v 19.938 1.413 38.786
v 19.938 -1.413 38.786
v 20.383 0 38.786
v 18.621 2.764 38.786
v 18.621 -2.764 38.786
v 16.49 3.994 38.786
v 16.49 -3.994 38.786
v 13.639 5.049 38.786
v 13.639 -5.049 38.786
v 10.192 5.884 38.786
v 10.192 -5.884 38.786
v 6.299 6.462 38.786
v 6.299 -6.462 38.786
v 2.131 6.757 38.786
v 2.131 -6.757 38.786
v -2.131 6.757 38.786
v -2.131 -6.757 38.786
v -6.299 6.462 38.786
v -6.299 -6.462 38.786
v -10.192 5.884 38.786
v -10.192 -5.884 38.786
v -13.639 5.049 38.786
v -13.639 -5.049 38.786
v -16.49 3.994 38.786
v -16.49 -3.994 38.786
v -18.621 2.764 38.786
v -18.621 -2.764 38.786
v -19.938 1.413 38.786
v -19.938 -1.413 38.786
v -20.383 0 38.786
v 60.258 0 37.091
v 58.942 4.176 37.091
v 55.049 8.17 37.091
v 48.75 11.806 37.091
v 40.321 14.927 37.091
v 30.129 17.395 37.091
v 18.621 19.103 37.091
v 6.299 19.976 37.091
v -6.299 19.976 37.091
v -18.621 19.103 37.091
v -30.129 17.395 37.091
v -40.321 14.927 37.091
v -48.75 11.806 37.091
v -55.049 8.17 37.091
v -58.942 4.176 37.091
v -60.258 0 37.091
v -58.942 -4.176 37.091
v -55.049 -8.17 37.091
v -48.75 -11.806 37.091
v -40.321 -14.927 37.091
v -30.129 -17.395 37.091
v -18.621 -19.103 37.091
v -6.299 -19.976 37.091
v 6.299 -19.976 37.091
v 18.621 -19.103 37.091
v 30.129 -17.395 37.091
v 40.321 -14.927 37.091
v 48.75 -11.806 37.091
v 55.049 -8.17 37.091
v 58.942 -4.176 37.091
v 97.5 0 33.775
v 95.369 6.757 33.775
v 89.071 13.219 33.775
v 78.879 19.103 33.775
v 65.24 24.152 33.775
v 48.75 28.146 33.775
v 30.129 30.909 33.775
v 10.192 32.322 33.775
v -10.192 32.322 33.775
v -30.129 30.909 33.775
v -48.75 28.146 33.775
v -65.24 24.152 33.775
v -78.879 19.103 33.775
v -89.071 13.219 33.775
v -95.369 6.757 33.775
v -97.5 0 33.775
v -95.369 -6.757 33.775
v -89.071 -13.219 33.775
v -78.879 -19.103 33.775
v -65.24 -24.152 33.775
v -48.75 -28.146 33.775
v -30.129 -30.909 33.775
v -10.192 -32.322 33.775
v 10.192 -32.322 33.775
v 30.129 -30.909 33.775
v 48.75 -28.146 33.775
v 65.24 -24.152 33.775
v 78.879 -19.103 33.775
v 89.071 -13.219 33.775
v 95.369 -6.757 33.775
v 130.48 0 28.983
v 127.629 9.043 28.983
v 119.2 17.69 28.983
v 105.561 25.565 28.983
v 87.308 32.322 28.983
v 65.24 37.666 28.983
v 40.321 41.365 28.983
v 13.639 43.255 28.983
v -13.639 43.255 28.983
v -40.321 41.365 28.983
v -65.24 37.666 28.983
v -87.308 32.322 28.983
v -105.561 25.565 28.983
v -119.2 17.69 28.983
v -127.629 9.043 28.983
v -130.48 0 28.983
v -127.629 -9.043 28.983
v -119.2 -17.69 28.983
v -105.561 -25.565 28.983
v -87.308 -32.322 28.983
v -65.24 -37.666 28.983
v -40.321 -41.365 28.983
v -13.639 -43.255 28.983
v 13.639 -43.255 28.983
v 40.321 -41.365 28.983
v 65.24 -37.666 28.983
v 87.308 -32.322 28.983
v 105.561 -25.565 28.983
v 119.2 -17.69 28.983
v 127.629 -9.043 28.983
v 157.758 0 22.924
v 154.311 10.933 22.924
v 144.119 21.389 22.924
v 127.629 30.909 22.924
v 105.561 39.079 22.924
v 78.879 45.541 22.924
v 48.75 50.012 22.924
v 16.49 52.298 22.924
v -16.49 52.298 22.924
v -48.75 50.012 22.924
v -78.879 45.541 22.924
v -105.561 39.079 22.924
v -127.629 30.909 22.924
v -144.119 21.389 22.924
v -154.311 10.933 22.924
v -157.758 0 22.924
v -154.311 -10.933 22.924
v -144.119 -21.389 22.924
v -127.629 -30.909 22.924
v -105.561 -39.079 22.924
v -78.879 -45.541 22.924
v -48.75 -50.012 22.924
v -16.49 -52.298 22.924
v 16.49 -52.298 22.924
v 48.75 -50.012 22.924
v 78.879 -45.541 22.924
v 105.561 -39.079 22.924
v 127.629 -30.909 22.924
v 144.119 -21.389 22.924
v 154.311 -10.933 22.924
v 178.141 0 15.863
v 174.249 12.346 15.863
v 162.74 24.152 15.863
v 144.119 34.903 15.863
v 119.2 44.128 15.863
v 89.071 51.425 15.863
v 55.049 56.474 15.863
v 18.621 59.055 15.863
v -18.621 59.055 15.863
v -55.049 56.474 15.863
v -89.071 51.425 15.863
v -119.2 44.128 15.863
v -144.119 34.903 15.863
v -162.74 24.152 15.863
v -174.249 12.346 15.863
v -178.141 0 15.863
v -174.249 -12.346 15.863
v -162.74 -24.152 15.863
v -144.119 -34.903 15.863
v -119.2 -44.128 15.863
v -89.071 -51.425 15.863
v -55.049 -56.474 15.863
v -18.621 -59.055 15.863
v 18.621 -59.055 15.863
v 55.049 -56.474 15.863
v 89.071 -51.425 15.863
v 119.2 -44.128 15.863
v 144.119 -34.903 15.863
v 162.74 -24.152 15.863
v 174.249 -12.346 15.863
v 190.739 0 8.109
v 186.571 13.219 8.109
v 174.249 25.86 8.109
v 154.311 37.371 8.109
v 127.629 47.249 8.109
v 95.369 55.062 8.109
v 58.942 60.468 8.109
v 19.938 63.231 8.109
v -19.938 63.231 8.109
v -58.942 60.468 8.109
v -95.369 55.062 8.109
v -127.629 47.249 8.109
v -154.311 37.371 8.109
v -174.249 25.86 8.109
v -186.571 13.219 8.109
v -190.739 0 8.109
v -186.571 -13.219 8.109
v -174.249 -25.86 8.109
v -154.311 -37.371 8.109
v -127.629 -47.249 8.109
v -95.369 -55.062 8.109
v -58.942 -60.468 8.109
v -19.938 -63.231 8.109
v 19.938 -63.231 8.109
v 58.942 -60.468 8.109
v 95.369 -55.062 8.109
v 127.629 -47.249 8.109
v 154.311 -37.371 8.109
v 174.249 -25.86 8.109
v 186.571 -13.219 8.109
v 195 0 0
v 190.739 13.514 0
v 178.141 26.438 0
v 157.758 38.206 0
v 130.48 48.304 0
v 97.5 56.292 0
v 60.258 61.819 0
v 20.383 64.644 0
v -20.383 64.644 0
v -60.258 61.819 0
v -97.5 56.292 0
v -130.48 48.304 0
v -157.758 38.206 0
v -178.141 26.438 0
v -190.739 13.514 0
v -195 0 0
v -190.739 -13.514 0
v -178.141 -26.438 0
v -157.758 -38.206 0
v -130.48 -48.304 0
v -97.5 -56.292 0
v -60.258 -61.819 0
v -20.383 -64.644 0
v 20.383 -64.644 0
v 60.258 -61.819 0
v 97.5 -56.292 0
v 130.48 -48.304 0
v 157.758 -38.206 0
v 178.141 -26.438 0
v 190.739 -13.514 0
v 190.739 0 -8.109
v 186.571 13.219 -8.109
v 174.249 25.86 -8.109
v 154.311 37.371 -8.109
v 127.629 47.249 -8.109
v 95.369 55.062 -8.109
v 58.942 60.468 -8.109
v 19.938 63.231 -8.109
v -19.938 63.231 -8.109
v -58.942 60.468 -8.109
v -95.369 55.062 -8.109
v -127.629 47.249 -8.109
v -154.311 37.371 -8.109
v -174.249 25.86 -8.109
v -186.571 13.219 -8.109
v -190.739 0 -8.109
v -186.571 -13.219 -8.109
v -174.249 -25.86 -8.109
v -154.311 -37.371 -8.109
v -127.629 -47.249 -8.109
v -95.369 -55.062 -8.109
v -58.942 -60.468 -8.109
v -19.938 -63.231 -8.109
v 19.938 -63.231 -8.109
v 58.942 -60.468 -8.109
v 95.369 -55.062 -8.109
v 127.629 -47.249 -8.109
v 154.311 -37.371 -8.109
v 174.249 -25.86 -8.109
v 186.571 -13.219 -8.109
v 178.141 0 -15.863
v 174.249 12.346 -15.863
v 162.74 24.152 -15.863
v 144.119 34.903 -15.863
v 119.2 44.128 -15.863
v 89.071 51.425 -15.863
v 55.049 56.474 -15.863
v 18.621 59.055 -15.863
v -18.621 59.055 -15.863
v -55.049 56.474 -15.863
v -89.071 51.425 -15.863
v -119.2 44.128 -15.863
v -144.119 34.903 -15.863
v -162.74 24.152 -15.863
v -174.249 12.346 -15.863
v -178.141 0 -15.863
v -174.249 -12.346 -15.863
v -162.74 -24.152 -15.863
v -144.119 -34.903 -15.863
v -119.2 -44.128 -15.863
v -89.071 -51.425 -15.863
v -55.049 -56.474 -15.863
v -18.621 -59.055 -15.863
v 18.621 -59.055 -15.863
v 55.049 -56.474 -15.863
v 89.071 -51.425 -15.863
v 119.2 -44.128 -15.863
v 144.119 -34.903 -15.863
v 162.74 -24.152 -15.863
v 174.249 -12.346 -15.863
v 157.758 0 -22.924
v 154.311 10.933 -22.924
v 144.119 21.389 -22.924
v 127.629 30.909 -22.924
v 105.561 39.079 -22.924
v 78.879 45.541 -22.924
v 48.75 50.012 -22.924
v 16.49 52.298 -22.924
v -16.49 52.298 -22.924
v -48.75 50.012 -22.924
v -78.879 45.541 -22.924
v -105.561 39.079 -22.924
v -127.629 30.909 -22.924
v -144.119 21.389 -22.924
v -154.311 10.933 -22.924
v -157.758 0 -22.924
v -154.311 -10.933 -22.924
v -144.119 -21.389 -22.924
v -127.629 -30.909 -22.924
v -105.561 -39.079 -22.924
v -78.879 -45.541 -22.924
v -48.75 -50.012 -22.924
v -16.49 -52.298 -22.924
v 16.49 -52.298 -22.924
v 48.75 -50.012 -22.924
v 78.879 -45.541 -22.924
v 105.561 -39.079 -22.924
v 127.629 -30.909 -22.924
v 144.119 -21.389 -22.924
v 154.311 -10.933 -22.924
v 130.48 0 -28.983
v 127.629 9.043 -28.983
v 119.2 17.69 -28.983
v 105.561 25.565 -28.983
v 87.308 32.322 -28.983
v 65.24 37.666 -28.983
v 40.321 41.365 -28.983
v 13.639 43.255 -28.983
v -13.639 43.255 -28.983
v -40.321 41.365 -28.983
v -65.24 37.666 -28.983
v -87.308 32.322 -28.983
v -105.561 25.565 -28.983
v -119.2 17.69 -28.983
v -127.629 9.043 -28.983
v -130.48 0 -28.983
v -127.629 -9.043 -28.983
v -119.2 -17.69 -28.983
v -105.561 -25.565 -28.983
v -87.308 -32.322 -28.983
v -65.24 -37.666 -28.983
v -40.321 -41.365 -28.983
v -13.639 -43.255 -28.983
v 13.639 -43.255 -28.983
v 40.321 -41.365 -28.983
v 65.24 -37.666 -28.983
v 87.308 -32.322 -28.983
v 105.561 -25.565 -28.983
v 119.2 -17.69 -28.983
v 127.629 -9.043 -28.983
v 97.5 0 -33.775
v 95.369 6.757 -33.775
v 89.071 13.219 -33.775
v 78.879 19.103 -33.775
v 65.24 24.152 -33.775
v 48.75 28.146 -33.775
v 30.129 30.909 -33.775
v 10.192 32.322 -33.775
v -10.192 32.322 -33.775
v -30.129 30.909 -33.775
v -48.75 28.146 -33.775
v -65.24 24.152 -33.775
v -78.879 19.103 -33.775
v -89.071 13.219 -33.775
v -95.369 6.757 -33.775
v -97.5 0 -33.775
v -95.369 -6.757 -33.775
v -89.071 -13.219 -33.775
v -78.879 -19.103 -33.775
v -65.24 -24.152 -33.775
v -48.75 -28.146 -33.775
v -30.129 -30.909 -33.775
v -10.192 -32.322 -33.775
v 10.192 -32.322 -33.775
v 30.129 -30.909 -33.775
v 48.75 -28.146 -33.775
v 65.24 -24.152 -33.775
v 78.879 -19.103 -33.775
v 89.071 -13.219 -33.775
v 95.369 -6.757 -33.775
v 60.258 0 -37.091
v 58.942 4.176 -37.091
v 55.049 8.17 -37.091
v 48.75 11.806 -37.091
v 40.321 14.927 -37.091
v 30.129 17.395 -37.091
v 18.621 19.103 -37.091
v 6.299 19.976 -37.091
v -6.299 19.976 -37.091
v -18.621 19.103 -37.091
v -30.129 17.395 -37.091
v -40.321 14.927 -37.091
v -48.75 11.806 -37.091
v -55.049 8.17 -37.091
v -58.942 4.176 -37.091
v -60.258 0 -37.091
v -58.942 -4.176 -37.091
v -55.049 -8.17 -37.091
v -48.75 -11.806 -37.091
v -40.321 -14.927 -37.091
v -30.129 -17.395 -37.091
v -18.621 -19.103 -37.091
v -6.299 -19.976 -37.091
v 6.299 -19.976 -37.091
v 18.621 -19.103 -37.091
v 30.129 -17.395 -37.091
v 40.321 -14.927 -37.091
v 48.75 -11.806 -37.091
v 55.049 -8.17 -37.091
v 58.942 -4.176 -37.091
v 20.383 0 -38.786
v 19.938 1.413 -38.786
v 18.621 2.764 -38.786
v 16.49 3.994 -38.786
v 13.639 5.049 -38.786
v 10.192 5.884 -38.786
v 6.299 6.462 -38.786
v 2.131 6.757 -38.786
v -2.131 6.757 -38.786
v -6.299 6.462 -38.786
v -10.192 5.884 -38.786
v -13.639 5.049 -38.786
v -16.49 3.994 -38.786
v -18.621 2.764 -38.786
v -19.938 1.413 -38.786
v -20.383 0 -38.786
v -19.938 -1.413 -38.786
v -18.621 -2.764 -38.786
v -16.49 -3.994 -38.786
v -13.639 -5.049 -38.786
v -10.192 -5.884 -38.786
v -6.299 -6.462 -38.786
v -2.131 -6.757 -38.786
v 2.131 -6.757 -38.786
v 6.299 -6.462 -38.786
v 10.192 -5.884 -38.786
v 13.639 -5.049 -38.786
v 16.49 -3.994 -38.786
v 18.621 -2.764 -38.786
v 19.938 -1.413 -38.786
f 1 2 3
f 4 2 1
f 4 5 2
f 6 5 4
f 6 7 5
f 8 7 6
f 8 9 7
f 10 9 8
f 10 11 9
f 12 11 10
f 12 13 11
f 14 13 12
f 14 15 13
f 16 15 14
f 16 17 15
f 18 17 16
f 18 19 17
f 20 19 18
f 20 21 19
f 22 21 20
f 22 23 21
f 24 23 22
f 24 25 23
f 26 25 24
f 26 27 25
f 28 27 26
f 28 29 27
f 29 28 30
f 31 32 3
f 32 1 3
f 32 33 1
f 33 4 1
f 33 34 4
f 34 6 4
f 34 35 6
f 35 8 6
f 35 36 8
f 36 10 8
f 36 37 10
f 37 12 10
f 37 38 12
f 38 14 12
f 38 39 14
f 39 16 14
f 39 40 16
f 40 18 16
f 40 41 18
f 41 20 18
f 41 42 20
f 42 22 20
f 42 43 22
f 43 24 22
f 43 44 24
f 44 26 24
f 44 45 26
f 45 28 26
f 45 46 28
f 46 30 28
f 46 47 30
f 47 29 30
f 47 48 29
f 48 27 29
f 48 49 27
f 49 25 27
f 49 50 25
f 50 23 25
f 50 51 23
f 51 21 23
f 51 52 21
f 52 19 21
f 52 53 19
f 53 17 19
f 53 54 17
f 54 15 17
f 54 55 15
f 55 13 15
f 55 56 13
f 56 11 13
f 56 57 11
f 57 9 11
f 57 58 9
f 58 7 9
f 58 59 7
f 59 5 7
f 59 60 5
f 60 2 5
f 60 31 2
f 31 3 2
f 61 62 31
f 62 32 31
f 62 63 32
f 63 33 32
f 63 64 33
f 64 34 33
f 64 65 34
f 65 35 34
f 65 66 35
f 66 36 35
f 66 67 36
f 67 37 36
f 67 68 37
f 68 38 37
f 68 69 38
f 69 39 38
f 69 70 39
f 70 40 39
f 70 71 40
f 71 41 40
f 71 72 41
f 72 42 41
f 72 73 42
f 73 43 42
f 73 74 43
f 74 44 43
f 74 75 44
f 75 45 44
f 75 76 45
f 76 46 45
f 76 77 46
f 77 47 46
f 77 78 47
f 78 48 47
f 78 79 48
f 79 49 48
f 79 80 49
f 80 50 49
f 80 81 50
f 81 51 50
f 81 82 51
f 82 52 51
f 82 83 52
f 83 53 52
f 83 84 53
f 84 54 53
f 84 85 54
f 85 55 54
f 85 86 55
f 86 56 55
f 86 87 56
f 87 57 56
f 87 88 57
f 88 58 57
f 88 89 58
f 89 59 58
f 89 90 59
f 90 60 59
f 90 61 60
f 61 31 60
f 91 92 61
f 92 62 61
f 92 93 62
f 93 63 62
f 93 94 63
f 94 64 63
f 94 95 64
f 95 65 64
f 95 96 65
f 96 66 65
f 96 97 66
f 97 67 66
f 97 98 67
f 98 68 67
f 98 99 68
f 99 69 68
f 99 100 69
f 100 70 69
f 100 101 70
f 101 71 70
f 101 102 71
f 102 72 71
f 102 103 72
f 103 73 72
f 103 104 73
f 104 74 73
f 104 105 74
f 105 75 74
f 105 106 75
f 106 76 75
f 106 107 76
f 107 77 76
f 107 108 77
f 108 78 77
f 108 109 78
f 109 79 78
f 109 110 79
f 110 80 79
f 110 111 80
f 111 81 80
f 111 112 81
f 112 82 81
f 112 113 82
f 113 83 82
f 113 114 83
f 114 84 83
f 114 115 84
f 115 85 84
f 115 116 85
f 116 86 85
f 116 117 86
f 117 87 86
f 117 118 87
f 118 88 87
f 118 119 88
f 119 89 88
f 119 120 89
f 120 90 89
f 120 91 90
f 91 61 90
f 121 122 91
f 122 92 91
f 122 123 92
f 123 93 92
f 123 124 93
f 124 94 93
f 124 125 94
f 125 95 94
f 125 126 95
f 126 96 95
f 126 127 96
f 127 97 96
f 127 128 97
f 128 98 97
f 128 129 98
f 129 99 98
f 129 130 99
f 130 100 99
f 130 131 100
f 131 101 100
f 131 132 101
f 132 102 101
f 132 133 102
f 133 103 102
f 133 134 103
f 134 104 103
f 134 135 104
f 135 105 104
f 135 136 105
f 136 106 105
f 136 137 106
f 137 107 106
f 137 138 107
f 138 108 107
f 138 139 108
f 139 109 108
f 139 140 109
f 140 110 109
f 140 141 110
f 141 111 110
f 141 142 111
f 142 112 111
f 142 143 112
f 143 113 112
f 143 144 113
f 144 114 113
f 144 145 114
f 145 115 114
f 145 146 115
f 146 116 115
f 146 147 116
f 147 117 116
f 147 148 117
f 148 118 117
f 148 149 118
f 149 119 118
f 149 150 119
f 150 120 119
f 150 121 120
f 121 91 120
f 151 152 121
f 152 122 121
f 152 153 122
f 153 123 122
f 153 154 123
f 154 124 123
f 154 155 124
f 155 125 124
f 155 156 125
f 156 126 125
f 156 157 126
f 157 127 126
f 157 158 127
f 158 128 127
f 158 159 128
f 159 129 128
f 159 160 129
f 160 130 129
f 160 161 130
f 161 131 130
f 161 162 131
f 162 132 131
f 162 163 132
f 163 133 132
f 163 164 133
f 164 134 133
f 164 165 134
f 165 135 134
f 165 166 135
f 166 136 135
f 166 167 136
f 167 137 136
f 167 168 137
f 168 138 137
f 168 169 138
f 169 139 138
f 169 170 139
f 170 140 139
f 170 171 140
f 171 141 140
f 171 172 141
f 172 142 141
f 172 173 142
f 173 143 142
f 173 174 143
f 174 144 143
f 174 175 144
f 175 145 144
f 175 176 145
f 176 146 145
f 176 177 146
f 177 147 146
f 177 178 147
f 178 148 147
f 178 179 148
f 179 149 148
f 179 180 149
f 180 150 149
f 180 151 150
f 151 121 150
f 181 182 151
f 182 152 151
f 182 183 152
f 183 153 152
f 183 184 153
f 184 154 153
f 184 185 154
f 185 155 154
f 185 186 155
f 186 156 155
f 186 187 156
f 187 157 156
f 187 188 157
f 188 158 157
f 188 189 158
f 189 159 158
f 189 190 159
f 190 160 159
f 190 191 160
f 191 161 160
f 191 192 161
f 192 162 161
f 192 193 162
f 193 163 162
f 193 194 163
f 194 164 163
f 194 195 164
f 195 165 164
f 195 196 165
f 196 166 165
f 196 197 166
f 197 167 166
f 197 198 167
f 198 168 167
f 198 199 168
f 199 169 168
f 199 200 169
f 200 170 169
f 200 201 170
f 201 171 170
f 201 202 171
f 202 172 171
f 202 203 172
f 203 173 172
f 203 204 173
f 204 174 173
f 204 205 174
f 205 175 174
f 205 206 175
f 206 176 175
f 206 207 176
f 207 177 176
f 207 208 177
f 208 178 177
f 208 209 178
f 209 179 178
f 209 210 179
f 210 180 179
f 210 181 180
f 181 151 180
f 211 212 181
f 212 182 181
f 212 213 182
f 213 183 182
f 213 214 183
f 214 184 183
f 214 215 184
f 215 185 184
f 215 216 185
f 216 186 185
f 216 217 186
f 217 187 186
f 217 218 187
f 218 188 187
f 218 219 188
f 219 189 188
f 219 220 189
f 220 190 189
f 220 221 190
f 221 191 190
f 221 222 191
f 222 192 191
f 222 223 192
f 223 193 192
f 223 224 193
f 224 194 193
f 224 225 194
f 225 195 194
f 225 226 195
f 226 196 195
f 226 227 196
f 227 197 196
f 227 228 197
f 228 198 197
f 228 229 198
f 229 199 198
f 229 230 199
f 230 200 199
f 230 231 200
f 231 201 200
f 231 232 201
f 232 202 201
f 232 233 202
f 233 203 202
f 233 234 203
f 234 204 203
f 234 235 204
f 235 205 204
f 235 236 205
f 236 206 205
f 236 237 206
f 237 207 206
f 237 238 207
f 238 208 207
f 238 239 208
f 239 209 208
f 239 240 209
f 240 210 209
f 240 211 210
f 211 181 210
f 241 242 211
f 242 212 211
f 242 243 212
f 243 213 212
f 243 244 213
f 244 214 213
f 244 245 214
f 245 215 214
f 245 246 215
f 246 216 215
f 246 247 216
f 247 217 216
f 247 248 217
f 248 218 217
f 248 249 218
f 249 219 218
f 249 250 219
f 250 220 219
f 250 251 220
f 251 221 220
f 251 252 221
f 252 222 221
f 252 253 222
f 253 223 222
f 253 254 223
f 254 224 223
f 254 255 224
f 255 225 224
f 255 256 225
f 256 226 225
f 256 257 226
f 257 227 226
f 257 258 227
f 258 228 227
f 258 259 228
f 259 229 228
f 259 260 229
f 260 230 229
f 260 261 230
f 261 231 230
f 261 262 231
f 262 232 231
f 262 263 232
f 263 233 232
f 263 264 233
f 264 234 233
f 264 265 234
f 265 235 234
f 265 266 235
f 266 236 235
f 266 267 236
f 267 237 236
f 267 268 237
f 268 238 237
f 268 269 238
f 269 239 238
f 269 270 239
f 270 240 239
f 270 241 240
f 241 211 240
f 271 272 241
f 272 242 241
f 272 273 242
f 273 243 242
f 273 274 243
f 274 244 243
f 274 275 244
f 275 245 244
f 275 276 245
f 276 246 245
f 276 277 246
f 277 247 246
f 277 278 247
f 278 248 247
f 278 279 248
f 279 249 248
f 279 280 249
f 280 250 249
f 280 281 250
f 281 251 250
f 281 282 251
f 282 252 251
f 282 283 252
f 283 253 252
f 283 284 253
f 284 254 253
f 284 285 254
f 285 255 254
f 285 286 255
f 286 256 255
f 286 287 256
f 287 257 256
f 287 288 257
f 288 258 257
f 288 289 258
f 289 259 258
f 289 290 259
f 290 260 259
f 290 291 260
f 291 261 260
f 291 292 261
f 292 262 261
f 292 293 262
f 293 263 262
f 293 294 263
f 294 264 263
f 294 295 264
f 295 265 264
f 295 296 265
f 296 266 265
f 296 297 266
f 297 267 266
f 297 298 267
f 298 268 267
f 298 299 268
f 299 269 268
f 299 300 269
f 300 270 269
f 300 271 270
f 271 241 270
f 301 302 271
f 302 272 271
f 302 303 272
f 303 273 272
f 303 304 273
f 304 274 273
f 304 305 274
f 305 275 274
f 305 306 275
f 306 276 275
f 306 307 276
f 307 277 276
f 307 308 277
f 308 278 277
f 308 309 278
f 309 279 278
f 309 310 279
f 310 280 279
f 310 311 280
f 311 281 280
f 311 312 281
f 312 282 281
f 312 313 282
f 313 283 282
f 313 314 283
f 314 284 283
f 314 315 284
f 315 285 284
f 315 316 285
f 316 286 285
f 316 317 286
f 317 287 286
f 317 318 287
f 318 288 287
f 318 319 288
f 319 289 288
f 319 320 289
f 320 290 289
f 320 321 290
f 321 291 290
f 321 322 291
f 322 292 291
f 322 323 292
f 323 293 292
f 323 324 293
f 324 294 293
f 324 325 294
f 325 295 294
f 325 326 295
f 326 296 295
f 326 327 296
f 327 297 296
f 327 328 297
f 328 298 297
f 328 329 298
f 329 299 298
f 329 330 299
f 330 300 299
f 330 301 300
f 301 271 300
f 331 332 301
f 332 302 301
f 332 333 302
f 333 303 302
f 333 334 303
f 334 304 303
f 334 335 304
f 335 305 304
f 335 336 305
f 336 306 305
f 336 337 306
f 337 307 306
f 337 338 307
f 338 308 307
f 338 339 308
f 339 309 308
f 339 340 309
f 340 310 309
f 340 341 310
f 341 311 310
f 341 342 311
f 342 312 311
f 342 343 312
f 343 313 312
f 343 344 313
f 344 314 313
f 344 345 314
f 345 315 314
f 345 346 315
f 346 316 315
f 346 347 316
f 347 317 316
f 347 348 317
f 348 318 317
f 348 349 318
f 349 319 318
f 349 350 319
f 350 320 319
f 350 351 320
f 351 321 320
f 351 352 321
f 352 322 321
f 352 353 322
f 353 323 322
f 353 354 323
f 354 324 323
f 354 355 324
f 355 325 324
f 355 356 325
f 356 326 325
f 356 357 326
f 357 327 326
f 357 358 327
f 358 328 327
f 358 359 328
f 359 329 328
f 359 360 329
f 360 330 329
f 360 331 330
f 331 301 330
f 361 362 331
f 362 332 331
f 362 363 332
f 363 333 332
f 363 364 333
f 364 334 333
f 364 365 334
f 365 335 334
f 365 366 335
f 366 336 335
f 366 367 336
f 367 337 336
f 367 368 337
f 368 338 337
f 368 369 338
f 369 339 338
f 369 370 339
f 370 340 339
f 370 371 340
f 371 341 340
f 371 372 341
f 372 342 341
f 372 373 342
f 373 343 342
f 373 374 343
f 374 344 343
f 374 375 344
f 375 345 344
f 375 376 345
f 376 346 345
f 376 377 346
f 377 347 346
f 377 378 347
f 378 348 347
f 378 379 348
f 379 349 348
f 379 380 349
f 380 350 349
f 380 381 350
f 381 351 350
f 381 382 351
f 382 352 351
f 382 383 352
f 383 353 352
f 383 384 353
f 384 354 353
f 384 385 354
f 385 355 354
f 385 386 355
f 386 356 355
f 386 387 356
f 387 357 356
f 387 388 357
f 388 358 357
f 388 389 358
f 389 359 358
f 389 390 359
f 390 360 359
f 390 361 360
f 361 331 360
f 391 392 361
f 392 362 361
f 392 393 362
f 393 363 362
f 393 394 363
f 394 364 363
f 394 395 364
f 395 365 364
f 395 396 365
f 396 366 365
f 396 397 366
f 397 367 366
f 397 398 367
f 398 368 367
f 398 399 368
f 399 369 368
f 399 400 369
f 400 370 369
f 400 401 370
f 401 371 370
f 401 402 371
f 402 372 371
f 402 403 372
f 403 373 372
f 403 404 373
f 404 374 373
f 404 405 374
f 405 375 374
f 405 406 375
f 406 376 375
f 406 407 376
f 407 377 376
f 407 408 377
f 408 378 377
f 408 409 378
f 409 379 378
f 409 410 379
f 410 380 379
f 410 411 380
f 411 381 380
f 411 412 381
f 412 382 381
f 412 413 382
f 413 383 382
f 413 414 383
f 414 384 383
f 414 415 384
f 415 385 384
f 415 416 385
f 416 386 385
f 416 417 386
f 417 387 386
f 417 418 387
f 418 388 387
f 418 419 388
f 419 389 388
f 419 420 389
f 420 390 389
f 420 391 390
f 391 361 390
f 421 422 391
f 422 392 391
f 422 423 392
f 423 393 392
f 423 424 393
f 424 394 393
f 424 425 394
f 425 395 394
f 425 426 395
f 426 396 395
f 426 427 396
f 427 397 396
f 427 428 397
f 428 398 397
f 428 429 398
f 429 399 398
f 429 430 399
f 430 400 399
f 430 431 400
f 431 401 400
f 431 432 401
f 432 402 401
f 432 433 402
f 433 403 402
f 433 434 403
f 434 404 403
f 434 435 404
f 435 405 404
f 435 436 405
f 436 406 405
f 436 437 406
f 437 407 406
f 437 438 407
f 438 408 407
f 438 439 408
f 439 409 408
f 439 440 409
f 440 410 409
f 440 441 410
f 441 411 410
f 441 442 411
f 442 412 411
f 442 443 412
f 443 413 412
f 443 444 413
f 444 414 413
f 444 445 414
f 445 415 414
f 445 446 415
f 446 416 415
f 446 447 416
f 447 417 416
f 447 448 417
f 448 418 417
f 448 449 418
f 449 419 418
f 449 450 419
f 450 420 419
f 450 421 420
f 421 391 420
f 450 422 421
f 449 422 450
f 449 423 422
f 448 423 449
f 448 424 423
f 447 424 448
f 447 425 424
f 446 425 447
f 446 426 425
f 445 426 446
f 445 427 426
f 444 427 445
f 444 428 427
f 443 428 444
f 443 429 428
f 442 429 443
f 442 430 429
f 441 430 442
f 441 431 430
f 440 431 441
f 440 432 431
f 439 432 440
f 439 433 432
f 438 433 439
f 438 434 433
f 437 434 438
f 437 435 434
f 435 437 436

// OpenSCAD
// Generated by SolidPython 1.0.1 on 2020-07-29 00:46:51


scale(v = [15, 5, 3]) {
	sphere(r = 13);
}
/***********************************************
*********      SolidPython code:      **********
************************************************
 
# import packages: SolidPython
from solid import *
from solid.utils import *
from itertools import chain, combinations, permutations


class Resize:

    def __init__(self, scad_file):
        self.scad_file = scad_file
        #self.scad_file = import_scad(scad_file)
        # cone/cylinder param:
        self.r1 = 0
        self.r2 = 0
        self.h = 0
        # rectangular prism param:
        self.w = 0
        self.l = 0
        # ellipse param:
        self.r = 0

    # import OpenScad code (file name corresponds to shape)


    # classify shape + parameters
    def assign(self, param1, param2, param3):
        if self.scad_file == 'cone.scad':
            self.r1 = param1
            self.r2 = param2
            self.h = param3
        elif self.scad_file == 'cylinder.scad':
            self.r1 = param1
            self.r2 = param2
            self.h = param3
        elif self.scad_file == 'rectangularPrism.scad':
            self.h = param1
            self.l = param2
            self.w = param3
        else:
            self.r = param1
            self.h = param2

    # resize parameters
    def iterate(self):
        x = range(3, 20, 2)
        i = 1
        if self.scad_file == 'cone.scad':
            tempList = list(permutations(x, 2))
            for temp in tempList:
                param1 = temp[0]
                param2 = temp[1]
                filepath = 'produced_scad_files/' + 'cone' + str(param1) + '_' + str(param2) + '_' + '.scad'
                scad_render_to_file(cylinder(h=param1, r1=param2, r2=0), filepath)

        elif self.scad_file == 'cylinder.scad':
            tempList = list(permutations(x, 3))
            for temp in tempList:
                param1 = temp[0]
                param2 = temp[1]
                filepath = 'produced_scad_files/' + 'cylinder' + str(param1) + '_' + str(param2) + '_' + '.scad'
                scad_render_to_file(cylinder(h=param1, r1=param2, r2=param2), filepath)

        elif self.scad_file == 'rectangularPrism.scad':
            tempList = list(permutations(x, 3))
            for temp in tempList:
                param1 = temp[0]
                param2 = temp[1]
                param3 = temp[2]
                filepath = 'produced_scad_files/' + 'rectangularPrism' + str(param1) + '_' + str(param2) + '_' + str(
                    param3) + '.scad'
                scad_render_to_file(cube(size=(param1, param2, param3)), filepath)

        elif self.scad_file == 'ellipse.scad':
            tempList = list(permutations(x, 4))
            for temp in tempList:
                param1 = temp[0]
                param2 = temp[1]
                param3 = temp[2]
                param4 = temp[3]
                filepath = 'produced_scad_files/' + 'ellipse' + str(param1) + '_' + str(param2) + '_' + str(param3) + '_' + str(param4) + '.scad'
                scad_render_to_file(scale([param1, param2, param3])(sphere(r=param4)), filepath)

    def render_to_scadfile(self):
        scad_render_to_file(scad, 'example.scad') 
 
************************************************/
